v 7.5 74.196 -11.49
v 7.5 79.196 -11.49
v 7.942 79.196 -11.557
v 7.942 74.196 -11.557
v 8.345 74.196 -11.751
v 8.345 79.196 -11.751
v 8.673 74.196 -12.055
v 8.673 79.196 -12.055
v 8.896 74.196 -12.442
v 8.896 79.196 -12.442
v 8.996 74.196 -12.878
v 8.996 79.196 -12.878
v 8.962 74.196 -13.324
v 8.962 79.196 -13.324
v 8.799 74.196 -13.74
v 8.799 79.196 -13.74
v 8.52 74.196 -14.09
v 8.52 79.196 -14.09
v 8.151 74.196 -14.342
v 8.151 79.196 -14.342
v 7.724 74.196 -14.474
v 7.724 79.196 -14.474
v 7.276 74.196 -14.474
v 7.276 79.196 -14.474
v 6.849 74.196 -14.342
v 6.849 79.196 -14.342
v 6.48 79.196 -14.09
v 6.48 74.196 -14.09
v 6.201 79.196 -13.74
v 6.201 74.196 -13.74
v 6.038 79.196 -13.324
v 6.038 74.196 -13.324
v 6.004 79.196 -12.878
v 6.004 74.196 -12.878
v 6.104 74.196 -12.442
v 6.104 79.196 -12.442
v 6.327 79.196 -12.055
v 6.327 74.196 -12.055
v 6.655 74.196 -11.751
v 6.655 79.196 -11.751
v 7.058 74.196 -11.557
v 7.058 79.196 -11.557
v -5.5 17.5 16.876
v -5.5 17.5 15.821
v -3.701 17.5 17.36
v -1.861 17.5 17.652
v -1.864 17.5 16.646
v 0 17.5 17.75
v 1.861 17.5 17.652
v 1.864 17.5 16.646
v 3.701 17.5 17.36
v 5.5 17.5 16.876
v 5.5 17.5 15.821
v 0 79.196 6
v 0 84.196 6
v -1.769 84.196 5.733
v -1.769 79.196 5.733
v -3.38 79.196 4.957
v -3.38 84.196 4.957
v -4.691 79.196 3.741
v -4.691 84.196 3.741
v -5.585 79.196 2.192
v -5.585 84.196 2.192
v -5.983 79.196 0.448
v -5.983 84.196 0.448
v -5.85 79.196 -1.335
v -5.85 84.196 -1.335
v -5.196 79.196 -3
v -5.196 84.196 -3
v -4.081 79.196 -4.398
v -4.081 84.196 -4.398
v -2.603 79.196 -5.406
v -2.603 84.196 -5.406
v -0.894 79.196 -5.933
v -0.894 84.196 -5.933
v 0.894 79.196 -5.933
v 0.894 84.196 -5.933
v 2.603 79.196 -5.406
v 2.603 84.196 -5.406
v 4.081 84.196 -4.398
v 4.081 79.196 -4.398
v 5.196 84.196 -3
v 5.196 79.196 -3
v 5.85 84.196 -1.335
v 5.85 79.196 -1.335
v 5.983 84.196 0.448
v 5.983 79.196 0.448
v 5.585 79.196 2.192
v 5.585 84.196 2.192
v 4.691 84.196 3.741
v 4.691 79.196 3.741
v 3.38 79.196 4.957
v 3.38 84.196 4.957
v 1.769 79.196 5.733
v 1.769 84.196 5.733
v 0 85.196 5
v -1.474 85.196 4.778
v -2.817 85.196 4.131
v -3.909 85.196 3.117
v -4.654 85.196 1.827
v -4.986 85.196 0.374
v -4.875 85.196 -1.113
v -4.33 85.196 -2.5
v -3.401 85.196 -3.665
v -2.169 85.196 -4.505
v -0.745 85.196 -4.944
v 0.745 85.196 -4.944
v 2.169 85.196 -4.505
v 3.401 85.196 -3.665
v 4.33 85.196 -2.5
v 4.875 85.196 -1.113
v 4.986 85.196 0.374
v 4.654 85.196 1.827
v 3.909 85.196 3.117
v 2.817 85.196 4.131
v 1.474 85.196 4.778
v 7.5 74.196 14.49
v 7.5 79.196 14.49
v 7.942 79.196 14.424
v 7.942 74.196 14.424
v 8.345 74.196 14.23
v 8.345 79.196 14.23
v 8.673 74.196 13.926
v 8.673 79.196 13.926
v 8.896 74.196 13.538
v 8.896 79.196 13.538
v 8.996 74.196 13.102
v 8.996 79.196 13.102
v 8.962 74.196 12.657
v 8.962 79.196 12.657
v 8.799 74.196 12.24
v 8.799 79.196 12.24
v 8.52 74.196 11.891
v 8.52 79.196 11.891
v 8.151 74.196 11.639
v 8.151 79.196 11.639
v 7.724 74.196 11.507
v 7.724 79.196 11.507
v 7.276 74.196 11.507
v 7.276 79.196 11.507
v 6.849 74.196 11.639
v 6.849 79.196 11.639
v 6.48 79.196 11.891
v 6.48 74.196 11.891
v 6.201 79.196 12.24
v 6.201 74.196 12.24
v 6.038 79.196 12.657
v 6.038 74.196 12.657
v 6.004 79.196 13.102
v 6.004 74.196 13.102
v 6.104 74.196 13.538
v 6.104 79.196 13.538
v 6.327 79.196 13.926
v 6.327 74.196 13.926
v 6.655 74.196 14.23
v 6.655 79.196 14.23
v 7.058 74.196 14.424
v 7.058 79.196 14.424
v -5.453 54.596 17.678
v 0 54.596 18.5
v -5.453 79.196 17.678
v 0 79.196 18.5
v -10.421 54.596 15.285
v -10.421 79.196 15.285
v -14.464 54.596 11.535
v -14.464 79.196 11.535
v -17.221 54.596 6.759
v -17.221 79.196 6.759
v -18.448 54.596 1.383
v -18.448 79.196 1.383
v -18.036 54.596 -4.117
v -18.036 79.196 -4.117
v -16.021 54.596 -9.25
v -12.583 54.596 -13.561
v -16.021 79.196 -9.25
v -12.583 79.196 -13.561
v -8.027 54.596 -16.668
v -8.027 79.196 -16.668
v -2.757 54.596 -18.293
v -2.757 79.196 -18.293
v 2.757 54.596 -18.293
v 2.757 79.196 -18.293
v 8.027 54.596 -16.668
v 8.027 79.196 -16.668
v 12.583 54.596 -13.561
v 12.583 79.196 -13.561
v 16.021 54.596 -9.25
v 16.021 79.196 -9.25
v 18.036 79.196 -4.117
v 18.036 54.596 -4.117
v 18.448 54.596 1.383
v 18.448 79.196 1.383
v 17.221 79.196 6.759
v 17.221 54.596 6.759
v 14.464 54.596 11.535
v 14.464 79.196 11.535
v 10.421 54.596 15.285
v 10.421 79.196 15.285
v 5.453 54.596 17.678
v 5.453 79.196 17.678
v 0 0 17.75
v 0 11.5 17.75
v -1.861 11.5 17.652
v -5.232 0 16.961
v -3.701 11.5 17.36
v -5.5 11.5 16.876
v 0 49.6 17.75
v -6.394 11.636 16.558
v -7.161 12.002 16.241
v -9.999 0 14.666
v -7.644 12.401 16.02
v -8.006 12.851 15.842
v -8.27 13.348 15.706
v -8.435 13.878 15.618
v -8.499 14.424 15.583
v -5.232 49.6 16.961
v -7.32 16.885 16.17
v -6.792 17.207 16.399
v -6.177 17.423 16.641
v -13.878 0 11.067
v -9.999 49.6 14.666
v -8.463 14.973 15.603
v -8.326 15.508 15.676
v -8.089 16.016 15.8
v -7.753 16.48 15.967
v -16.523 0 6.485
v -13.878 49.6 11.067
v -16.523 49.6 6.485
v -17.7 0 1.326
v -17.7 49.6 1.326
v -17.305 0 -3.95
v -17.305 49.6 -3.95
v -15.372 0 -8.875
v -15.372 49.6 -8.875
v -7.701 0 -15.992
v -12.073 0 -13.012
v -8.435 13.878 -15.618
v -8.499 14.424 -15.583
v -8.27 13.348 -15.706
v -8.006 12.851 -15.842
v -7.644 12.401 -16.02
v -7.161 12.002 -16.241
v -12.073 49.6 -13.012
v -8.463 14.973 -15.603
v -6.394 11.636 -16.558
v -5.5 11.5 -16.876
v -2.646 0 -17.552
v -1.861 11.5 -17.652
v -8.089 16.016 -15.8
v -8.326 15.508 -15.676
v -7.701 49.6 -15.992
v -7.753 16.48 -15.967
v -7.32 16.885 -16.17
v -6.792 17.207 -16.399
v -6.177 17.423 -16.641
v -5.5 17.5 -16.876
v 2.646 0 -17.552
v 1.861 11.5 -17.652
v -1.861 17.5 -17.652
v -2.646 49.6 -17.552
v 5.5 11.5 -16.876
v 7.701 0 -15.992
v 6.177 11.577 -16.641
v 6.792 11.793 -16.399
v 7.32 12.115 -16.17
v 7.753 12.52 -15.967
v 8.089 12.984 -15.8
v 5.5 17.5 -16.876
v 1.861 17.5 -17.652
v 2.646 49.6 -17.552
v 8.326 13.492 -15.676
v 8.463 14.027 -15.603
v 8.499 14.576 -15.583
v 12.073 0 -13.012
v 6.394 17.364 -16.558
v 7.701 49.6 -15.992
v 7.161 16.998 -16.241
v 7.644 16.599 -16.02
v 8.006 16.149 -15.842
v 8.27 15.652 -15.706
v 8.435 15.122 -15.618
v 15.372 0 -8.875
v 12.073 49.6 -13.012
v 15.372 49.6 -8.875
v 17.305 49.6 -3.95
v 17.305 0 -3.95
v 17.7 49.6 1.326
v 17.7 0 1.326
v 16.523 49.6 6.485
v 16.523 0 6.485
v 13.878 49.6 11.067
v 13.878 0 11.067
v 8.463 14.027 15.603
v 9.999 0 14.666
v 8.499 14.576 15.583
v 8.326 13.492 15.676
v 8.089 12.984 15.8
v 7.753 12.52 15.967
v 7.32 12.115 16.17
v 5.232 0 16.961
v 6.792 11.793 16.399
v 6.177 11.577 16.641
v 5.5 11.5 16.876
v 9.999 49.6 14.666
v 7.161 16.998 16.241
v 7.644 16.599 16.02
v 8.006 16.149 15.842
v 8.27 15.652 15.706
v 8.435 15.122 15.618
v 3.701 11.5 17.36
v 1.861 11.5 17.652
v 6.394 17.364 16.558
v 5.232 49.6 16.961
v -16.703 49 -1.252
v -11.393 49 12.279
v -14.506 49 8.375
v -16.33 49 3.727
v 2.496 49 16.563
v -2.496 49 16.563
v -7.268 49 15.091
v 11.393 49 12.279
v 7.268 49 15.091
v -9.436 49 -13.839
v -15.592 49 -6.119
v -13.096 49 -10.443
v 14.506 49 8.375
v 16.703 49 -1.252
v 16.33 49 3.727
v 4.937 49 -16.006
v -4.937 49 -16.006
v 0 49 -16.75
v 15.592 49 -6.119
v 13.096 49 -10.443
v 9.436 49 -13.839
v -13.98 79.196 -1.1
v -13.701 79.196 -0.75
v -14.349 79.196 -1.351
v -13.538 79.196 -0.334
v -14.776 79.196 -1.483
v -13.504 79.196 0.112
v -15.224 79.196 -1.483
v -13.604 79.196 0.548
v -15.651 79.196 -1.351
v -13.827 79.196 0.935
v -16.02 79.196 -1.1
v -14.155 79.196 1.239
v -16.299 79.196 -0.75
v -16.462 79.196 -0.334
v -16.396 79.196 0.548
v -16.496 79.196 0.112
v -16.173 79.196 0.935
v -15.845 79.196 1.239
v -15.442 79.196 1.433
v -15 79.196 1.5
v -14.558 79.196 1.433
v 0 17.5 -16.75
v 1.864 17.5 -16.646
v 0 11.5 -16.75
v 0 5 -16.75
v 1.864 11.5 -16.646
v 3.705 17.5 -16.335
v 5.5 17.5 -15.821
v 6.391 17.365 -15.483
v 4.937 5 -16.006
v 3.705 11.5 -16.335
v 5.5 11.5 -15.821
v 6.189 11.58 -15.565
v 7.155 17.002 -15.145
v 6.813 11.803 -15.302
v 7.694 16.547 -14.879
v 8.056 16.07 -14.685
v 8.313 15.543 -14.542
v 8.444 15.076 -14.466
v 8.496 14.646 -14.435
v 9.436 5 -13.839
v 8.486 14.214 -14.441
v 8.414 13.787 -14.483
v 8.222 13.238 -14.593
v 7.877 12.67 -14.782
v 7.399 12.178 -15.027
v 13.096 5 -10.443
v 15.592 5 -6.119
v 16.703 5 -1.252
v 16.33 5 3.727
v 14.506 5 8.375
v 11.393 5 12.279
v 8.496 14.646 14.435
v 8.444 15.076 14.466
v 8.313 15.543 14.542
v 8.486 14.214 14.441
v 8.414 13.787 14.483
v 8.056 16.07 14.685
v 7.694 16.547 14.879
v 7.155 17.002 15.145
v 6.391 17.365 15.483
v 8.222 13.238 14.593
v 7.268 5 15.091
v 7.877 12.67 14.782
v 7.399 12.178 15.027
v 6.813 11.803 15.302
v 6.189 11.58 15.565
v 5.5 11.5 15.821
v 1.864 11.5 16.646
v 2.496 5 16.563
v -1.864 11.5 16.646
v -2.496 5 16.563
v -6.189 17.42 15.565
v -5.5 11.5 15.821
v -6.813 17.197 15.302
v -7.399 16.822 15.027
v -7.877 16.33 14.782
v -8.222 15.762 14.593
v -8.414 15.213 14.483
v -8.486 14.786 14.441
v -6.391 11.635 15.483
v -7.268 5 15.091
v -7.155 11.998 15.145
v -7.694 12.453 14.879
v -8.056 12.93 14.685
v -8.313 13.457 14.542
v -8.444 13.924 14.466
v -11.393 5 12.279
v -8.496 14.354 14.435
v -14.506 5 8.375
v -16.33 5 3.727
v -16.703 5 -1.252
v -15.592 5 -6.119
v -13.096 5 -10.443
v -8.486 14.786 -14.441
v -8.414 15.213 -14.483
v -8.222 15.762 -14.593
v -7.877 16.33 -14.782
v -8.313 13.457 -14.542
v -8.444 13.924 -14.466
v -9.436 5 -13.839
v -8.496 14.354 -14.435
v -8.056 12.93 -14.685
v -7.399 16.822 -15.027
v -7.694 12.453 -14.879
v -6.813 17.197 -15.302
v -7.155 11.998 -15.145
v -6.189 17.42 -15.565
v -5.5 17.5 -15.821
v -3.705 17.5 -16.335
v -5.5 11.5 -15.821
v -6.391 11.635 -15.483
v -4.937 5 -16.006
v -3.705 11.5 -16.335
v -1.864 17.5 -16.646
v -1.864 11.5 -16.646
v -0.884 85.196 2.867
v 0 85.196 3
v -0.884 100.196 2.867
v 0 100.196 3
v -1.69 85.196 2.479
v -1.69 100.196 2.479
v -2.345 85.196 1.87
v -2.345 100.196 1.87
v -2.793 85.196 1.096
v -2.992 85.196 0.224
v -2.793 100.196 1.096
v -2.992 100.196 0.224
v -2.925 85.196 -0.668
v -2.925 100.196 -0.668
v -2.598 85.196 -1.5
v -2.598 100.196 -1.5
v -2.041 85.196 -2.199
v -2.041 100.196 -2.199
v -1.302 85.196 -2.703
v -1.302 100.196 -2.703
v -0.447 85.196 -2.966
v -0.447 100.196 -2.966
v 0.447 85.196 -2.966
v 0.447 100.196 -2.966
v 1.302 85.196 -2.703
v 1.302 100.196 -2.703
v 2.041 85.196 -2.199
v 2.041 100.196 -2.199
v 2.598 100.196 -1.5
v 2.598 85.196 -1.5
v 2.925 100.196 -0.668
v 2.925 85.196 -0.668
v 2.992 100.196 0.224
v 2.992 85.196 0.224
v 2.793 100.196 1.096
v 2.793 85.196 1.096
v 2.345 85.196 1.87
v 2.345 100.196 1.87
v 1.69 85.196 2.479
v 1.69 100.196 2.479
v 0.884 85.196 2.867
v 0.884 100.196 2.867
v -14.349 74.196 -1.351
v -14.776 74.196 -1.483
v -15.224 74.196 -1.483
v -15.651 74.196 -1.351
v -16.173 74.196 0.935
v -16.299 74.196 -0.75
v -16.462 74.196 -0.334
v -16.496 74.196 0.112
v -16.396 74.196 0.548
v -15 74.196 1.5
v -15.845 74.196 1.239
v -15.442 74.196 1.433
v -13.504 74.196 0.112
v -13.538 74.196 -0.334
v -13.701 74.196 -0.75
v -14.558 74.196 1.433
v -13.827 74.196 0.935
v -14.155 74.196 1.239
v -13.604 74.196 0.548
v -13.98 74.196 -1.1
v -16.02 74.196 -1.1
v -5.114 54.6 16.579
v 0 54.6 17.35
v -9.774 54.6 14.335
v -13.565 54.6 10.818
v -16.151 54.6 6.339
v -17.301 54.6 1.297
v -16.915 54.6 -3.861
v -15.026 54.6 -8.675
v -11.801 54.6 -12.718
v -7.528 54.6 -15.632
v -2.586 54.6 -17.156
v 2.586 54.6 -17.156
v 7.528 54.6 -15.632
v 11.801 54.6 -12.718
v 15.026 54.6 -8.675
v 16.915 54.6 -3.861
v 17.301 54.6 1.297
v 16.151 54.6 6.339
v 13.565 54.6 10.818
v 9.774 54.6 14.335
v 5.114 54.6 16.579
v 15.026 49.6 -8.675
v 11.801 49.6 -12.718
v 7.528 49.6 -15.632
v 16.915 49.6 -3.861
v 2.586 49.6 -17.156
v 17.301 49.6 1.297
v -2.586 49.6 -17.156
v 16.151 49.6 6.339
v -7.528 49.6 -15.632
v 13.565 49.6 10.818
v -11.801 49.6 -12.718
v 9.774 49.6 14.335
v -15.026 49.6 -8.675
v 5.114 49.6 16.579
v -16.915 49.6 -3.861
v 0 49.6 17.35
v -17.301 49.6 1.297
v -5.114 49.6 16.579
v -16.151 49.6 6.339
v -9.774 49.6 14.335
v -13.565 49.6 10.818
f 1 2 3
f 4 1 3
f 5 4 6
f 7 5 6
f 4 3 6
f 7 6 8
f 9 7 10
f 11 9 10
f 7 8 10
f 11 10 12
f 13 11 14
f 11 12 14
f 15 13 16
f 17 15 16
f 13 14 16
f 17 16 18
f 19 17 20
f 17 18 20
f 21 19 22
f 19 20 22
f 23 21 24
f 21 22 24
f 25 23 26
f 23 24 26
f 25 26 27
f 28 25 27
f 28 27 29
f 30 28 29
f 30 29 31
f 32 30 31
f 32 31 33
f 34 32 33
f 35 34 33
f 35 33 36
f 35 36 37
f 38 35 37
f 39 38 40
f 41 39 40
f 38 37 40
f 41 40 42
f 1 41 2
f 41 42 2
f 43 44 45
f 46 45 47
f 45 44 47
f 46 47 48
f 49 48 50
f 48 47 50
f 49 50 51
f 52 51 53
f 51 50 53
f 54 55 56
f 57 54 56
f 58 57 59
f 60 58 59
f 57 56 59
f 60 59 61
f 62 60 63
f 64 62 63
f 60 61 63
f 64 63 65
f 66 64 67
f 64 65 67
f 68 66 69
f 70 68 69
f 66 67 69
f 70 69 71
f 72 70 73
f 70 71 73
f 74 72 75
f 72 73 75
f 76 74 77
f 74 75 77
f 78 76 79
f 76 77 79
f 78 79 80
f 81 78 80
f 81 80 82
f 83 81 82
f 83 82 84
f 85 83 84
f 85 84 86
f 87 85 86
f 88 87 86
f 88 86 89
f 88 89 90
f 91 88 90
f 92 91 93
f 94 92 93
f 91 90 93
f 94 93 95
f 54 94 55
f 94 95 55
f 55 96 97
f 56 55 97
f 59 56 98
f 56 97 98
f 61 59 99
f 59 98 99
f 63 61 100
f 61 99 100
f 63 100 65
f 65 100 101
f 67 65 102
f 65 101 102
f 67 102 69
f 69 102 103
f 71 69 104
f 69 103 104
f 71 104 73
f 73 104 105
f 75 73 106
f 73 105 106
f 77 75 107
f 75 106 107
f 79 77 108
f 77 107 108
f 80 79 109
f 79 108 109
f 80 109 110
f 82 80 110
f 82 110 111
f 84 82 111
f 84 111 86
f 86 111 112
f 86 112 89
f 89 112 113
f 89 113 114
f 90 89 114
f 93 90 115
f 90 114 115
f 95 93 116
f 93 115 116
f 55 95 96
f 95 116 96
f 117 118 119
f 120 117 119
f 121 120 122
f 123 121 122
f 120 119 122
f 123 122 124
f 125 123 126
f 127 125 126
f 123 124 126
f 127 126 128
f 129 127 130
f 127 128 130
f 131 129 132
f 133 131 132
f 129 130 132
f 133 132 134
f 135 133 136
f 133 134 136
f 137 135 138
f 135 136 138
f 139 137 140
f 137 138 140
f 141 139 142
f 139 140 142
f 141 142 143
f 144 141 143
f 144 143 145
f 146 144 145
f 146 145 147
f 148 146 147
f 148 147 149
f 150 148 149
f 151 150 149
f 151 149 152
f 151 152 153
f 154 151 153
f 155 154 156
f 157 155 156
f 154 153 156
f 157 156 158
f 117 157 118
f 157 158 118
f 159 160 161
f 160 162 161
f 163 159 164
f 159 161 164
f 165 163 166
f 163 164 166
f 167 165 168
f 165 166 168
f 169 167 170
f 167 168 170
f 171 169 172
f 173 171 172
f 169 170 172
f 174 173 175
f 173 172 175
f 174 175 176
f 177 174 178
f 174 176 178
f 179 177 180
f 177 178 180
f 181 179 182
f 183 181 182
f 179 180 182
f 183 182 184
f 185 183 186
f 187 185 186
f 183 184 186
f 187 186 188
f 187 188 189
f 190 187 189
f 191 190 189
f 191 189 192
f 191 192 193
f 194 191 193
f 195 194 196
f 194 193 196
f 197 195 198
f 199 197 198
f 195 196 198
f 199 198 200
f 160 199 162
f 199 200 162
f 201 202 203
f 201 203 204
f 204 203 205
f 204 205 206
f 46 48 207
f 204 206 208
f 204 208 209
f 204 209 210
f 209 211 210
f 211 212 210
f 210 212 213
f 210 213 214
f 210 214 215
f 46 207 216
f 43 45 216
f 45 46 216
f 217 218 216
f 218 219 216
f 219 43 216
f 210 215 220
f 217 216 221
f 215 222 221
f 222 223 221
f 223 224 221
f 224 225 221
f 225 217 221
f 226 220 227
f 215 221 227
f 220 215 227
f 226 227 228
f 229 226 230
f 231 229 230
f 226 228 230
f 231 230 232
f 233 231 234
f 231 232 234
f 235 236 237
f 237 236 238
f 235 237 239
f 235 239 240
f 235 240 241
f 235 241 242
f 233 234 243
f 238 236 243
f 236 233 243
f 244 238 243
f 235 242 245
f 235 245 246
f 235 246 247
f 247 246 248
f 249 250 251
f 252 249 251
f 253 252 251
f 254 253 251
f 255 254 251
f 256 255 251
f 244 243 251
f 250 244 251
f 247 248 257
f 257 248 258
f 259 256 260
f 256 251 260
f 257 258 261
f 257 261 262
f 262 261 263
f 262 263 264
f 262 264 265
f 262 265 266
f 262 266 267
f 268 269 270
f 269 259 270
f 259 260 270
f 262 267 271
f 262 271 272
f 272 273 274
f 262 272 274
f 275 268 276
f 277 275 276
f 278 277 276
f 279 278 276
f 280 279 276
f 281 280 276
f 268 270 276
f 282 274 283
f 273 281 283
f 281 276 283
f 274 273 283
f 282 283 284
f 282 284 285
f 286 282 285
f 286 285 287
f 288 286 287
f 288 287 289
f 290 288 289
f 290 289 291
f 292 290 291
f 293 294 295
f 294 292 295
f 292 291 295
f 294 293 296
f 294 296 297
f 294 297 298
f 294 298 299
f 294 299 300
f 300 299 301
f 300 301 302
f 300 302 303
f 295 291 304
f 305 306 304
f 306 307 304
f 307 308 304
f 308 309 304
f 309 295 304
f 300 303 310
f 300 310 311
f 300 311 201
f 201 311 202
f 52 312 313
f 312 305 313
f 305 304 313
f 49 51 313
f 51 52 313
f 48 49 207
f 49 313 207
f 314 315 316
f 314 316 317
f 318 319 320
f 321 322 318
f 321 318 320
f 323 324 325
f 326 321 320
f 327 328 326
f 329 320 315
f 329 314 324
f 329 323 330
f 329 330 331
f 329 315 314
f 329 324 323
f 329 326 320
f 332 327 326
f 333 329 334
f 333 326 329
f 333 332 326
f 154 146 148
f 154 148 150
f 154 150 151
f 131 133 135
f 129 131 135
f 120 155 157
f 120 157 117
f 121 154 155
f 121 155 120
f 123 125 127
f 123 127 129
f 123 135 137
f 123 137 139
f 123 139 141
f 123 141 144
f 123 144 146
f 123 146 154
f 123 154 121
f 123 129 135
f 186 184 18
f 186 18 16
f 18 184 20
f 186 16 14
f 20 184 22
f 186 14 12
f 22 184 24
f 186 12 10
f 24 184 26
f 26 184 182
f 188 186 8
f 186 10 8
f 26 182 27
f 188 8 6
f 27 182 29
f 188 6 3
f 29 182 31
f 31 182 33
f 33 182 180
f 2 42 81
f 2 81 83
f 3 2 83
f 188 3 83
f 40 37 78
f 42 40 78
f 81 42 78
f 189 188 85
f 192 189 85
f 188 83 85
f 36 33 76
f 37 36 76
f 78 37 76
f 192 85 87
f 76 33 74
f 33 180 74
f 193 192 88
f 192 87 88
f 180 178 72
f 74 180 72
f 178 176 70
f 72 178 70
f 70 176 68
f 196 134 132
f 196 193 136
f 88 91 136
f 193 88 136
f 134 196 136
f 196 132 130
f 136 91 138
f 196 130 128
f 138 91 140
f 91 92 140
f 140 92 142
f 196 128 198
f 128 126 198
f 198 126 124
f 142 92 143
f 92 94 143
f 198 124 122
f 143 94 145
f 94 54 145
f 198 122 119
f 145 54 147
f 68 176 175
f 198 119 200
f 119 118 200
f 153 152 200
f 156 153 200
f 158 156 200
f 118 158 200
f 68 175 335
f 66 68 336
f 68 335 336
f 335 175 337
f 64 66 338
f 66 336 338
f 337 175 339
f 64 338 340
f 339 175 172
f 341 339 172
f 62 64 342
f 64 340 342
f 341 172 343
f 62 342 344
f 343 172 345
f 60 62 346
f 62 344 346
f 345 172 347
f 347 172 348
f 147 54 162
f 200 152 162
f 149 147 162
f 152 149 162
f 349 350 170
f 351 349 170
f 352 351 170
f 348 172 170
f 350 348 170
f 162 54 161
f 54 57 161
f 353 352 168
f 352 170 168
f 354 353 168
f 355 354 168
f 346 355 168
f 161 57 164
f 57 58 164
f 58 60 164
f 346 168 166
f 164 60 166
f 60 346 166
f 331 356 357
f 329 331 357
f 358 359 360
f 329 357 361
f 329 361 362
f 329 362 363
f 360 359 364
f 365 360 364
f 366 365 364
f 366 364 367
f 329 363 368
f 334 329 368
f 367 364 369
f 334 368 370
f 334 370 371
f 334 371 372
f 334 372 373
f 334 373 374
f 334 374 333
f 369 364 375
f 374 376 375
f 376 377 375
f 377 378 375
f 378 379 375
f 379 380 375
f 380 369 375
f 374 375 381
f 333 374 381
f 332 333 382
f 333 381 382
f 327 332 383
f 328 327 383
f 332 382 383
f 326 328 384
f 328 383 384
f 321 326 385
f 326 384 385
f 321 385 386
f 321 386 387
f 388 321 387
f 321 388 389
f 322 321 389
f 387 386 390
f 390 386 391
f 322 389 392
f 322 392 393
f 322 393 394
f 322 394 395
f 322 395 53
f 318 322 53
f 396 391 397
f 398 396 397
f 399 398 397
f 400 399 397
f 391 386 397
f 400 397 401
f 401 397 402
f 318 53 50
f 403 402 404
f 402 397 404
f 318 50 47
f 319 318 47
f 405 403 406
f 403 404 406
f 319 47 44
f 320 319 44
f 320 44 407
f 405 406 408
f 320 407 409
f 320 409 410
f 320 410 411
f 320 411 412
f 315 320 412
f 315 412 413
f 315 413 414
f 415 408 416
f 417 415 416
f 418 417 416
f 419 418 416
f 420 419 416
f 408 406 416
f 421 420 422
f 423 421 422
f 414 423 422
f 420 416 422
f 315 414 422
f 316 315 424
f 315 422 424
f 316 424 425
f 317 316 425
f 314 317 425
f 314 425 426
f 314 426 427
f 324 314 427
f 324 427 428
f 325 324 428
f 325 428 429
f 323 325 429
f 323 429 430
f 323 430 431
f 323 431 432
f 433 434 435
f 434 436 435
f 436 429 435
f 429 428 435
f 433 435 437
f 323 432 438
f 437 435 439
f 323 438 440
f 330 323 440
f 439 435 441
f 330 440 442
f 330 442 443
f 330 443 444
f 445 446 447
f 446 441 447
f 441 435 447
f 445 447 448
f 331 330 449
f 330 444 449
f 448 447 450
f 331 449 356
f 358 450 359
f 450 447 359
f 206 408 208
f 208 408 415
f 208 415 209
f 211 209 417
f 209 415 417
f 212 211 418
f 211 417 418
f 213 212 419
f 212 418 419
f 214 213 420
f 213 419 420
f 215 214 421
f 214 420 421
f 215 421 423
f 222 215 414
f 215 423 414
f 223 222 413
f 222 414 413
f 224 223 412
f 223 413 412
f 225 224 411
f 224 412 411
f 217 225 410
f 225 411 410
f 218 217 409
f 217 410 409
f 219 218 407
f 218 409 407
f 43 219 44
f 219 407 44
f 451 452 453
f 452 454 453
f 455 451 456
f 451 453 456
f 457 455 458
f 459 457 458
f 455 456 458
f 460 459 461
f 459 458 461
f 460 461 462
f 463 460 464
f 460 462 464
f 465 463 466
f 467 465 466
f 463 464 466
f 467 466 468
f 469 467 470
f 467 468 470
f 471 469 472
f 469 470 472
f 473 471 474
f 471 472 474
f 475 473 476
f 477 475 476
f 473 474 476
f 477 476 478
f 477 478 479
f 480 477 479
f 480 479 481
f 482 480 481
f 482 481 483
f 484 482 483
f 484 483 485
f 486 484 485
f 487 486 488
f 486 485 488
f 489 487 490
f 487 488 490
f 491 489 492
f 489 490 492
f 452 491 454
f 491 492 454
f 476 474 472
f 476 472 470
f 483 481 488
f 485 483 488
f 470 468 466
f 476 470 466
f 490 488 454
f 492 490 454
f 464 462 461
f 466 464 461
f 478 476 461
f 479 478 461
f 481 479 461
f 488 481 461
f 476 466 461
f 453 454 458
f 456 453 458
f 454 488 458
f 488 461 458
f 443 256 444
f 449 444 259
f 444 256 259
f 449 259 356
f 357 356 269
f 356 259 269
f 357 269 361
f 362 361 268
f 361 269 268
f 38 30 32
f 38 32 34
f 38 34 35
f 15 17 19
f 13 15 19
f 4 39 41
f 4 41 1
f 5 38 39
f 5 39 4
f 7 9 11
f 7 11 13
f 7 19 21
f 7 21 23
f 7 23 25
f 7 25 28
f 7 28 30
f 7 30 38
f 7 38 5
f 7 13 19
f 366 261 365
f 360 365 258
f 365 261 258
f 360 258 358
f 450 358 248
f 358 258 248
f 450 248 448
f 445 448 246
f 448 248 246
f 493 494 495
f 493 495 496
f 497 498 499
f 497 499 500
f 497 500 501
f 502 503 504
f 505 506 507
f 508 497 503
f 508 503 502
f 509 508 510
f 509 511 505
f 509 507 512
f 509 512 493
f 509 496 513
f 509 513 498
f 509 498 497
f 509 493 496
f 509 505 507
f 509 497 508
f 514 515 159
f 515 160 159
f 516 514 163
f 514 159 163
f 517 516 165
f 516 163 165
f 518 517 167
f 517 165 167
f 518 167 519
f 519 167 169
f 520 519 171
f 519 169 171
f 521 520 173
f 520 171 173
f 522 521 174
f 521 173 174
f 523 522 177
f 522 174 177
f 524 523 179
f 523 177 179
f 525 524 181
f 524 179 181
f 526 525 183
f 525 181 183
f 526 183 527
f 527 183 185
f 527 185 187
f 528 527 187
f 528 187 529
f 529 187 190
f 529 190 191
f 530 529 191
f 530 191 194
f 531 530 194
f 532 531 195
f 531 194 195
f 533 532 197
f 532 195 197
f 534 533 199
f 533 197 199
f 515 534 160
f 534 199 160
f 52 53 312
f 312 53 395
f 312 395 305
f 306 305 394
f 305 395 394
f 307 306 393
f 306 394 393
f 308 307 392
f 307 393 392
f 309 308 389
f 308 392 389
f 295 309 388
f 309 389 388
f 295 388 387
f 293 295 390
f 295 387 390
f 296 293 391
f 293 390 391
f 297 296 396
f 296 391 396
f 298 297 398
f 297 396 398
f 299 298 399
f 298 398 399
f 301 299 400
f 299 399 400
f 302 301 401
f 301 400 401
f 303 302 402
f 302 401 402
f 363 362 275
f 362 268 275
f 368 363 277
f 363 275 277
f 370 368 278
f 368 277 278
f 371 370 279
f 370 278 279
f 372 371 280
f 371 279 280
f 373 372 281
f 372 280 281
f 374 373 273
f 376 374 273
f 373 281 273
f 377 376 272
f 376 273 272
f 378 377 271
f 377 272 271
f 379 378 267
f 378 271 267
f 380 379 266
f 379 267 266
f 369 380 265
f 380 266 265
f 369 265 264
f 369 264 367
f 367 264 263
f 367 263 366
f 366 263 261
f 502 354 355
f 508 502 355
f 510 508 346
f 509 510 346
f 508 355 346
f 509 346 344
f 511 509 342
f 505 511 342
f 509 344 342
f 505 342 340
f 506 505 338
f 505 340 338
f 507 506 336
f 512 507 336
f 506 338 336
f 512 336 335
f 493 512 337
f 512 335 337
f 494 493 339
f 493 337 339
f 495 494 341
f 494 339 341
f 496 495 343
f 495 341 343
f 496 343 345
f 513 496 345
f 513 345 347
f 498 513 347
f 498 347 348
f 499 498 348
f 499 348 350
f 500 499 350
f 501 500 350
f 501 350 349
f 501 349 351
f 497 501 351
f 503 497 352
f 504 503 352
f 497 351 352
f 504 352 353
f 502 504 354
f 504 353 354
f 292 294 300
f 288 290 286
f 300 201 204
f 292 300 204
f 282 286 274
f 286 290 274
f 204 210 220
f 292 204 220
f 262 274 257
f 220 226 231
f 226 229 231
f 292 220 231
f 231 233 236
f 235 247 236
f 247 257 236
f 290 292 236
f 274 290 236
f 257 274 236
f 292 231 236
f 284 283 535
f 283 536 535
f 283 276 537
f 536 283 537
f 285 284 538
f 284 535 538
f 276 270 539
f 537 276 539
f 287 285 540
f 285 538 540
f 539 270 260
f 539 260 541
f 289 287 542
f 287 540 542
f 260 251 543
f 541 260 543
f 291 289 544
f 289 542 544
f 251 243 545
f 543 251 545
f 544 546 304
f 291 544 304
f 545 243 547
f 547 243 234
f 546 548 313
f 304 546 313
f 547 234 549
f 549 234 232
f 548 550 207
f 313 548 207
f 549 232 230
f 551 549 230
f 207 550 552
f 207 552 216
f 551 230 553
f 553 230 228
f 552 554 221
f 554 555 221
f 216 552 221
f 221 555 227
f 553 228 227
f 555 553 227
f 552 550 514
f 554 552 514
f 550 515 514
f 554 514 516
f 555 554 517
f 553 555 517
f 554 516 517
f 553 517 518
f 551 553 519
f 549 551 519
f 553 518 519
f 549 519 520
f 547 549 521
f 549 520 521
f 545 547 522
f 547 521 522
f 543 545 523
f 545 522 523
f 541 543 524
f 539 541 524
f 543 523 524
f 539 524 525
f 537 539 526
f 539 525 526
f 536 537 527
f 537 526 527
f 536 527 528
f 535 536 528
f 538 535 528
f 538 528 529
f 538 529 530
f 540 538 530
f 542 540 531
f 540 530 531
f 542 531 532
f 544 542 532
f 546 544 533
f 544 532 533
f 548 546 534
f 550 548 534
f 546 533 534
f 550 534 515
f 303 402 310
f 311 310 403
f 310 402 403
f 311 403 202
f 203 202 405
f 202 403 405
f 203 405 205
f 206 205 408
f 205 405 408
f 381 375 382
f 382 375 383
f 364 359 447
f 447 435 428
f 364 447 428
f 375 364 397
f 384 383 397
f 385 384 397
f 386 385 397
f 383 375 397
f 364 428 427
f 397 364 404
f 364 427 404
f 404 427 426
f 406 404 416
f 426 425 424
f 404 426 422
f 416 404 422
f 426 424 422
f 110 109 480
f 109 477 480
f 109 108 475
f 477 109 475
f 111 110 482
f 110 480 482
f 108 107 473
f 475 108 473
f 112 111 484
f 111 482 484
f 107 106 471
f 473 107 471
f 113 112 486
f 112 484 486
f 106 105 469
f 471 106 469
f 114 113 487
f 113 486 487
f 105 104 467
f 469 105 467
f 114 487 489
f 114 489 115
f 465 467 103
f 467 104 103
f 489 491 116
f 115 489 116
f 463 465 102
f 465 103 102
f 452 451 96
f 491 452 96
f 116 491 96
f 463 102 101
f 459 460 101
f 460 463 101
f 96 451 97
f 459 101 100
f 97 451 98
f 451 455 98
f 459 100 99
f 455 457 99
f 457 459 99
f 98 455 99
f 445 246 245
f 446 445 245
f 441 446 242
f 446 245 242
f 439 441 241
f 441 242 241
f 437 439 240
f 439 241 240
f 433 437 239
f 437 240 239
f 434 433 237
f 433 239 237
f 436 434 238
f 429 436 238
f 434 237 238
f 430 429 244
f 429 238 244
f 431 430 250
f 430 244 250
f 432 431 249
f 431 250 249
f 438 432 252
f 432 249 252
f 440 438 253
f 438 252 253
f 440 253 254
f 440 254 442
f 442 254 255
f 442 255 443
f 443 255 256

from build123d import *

# Parameters (mm, degrees)
EXTRUSION1_REACH                  = 105.556
EXTRUSION1_END_RADIUS             = 17.75
EXTRUSION1_DIRECTION_2_REACH      = 105.556
EXTRUSION1_DIRECTION_2_END_RADIUS = 17.75
CHANFREIN1_SIZE                   = 1
ESQUISSE3_R                       = 16.75
EXTRUSION2_DEPTH                  = 49
EXTRUSION3_START                  = -5
ESQUISSE6_R                       = 17.75
EXTRUSION3_DEPTH                  = 5
ESQUISSE8_R                       = 1.5
EXTRUSION4_DEPTH                  = 5


with BuildPart() as part:
    # Esquisse1 → Révolution1 (revolve)
    with BuildSketch(Plane.XY, mode=Mode.PRIVATE) as r_volution1_sk:
        Polygon((0, 0), (17.75, 0), (17.75, 49.6), (17.35, 49.6), (17.35, 54.6), (18.5, 54.596448784), (18.5, 79.196448784), (6, 79.196448784), (6, 85.196448784), (3, 85.196448784), (3, 100.196448784), (0, 100.196448784), align=None)
    revolve(r_volution1_sk.sketch.rotate(Axis((0, 100.196448784, 0), (0, -1, 0)), 90), axis=Axis((0, 100.196448784, 0), (0, -1, 0)))

    # Extrusion1: up to this cylinder (the profile starts inside it)
    extrusion1_end = Plane(origin=(0, 14.5, 0), z_dir=(0, 1, 0)) * Cylinder(EXTRUSION1_END_RADIUS, 247.612, mode=Mode.PRIVATE)
    # Esquisse2 → Extrusion1 (cut, up to the surface)
    with BuildSketch(Plane.XY, mode=Mode.PRIVATE) as extrusion1_sk1:
        with BuildLine():
            Line((-5.5, 17.5), (5.5, 17.5))
            ThreePointArc((5.5, 17.5), (8.5, 14.5), (5.5, 11.5))
            Line((5.5, 11.5), (-5.5, 11.5))
            ThreePointArc((-5.5, 11.5), (-8.5, 14.5), (-5.5, 17.5))
        make_face()
    extrusion1_tool1 = extrude(extrusion1_sk1.sketch, amount=EXTRUSION1_REACH, mode=Mode.PRIVATE) & extrusion1_end
    add(extrusion1_tool1.solids().sort_by_distance((0, 14.5, 0))[0], mode=Mode.SUBTRACT)

    # Extrusion1 direction 2: up to this cylinder (the profile starts inside it)
    extrusion1_direction_2_end = Plane(origin=(0, 14.5, 0), z_dir=(0, 1, 0)) * Cylinder(EXTRUSION1_DIRECTION_2_END_RADIUS, 247.612, mode=Mode.PRIVATE)
    # Esquisse2 → Extrusion1 direction 2 (cut, up to the surface)
    with BuildSketch(Plane.XY, mode=Mode.PRIVATE) as extrusion1_direction_2_sk1:
        with BuildLine():
            Line((-5.5, 17.5), (5.5, 17.5))
            ThreePointArc((5.5, 17.5), (8.5, 14.5), (5.5, 11.5))
            Line((5.5, 11.5), (-5.5, 11.5))
            ThreePointArc((-5.5, 11.5), (-8.5, 14.5), (-5.5, 17.5))
        make_face()
    extrusion1_direction_2_tool1 = extrude(extrusion1_direction_2_sk1.sketch, amount=-EXTRUSION1_DIRECTION_2_REACH, mode=Mode.PRIVATE) & extrusion1_direction_2_end
    add(extrusion1_direction_2_tool1.solids().sort_by_distance((0, 14.5, 0))[0], mode=Mode.SUBTRACT)

    # Chanfrein1
    chanfrein1_edges = [part.edges().sort_by_distance(p)[0] for p in [
        (0, 85.196448784, -6),
    ]]
    chamfer(chanfrein1_edges, length=CHANFREIN1_SIZE)

    # Esquisse3 → Extrusion2 (cut)
    with BuildSketch(Plane.XZ):
        with Locations(Location((0, 0, 0), (0, 0, 270))):
            Circle(ESQUISSE3_R)
    extrude(amount=-EXTRUSION2_DEPTH, mode=Mode.SUBTRACT)

    # Esquisse6 → Extrusion3 (add)
    with BuildSketch(Plane.XZ.offset(EXTRUSION3_START)):
        with Locations(Location((0, 0, 0), (0, 0, 90))):
            Circle(ESQUISSE6_R)
    extrude(amount=EXTRUSION3_DEPTH)

    # Esquisse8 → Extrusion4 (cut)
    with BuildSketch(Plane(origin=(0, 79.196448784, 0), x_dir=(-1, 0, 0), z_dir=(0, 1, 0))):
        with Locations(Location((15, 0, 0), (0, 0, 90))):
            Circle(ESQUISSE8_R)
        with Locations(Location((-7.5, -12.990381057, 0), (0, 0, 90))):
            Circle(ESQUISSE8_R)
        with Locations(Location((-7.5, 12.990381057, 0), (0, 0, 90))):
            Circle(ESQUISSE8_R)
    extrude(amount=-EXTRUSION4_DEPTH, mode=Mode.SUBTRACT)


solid = part.part
